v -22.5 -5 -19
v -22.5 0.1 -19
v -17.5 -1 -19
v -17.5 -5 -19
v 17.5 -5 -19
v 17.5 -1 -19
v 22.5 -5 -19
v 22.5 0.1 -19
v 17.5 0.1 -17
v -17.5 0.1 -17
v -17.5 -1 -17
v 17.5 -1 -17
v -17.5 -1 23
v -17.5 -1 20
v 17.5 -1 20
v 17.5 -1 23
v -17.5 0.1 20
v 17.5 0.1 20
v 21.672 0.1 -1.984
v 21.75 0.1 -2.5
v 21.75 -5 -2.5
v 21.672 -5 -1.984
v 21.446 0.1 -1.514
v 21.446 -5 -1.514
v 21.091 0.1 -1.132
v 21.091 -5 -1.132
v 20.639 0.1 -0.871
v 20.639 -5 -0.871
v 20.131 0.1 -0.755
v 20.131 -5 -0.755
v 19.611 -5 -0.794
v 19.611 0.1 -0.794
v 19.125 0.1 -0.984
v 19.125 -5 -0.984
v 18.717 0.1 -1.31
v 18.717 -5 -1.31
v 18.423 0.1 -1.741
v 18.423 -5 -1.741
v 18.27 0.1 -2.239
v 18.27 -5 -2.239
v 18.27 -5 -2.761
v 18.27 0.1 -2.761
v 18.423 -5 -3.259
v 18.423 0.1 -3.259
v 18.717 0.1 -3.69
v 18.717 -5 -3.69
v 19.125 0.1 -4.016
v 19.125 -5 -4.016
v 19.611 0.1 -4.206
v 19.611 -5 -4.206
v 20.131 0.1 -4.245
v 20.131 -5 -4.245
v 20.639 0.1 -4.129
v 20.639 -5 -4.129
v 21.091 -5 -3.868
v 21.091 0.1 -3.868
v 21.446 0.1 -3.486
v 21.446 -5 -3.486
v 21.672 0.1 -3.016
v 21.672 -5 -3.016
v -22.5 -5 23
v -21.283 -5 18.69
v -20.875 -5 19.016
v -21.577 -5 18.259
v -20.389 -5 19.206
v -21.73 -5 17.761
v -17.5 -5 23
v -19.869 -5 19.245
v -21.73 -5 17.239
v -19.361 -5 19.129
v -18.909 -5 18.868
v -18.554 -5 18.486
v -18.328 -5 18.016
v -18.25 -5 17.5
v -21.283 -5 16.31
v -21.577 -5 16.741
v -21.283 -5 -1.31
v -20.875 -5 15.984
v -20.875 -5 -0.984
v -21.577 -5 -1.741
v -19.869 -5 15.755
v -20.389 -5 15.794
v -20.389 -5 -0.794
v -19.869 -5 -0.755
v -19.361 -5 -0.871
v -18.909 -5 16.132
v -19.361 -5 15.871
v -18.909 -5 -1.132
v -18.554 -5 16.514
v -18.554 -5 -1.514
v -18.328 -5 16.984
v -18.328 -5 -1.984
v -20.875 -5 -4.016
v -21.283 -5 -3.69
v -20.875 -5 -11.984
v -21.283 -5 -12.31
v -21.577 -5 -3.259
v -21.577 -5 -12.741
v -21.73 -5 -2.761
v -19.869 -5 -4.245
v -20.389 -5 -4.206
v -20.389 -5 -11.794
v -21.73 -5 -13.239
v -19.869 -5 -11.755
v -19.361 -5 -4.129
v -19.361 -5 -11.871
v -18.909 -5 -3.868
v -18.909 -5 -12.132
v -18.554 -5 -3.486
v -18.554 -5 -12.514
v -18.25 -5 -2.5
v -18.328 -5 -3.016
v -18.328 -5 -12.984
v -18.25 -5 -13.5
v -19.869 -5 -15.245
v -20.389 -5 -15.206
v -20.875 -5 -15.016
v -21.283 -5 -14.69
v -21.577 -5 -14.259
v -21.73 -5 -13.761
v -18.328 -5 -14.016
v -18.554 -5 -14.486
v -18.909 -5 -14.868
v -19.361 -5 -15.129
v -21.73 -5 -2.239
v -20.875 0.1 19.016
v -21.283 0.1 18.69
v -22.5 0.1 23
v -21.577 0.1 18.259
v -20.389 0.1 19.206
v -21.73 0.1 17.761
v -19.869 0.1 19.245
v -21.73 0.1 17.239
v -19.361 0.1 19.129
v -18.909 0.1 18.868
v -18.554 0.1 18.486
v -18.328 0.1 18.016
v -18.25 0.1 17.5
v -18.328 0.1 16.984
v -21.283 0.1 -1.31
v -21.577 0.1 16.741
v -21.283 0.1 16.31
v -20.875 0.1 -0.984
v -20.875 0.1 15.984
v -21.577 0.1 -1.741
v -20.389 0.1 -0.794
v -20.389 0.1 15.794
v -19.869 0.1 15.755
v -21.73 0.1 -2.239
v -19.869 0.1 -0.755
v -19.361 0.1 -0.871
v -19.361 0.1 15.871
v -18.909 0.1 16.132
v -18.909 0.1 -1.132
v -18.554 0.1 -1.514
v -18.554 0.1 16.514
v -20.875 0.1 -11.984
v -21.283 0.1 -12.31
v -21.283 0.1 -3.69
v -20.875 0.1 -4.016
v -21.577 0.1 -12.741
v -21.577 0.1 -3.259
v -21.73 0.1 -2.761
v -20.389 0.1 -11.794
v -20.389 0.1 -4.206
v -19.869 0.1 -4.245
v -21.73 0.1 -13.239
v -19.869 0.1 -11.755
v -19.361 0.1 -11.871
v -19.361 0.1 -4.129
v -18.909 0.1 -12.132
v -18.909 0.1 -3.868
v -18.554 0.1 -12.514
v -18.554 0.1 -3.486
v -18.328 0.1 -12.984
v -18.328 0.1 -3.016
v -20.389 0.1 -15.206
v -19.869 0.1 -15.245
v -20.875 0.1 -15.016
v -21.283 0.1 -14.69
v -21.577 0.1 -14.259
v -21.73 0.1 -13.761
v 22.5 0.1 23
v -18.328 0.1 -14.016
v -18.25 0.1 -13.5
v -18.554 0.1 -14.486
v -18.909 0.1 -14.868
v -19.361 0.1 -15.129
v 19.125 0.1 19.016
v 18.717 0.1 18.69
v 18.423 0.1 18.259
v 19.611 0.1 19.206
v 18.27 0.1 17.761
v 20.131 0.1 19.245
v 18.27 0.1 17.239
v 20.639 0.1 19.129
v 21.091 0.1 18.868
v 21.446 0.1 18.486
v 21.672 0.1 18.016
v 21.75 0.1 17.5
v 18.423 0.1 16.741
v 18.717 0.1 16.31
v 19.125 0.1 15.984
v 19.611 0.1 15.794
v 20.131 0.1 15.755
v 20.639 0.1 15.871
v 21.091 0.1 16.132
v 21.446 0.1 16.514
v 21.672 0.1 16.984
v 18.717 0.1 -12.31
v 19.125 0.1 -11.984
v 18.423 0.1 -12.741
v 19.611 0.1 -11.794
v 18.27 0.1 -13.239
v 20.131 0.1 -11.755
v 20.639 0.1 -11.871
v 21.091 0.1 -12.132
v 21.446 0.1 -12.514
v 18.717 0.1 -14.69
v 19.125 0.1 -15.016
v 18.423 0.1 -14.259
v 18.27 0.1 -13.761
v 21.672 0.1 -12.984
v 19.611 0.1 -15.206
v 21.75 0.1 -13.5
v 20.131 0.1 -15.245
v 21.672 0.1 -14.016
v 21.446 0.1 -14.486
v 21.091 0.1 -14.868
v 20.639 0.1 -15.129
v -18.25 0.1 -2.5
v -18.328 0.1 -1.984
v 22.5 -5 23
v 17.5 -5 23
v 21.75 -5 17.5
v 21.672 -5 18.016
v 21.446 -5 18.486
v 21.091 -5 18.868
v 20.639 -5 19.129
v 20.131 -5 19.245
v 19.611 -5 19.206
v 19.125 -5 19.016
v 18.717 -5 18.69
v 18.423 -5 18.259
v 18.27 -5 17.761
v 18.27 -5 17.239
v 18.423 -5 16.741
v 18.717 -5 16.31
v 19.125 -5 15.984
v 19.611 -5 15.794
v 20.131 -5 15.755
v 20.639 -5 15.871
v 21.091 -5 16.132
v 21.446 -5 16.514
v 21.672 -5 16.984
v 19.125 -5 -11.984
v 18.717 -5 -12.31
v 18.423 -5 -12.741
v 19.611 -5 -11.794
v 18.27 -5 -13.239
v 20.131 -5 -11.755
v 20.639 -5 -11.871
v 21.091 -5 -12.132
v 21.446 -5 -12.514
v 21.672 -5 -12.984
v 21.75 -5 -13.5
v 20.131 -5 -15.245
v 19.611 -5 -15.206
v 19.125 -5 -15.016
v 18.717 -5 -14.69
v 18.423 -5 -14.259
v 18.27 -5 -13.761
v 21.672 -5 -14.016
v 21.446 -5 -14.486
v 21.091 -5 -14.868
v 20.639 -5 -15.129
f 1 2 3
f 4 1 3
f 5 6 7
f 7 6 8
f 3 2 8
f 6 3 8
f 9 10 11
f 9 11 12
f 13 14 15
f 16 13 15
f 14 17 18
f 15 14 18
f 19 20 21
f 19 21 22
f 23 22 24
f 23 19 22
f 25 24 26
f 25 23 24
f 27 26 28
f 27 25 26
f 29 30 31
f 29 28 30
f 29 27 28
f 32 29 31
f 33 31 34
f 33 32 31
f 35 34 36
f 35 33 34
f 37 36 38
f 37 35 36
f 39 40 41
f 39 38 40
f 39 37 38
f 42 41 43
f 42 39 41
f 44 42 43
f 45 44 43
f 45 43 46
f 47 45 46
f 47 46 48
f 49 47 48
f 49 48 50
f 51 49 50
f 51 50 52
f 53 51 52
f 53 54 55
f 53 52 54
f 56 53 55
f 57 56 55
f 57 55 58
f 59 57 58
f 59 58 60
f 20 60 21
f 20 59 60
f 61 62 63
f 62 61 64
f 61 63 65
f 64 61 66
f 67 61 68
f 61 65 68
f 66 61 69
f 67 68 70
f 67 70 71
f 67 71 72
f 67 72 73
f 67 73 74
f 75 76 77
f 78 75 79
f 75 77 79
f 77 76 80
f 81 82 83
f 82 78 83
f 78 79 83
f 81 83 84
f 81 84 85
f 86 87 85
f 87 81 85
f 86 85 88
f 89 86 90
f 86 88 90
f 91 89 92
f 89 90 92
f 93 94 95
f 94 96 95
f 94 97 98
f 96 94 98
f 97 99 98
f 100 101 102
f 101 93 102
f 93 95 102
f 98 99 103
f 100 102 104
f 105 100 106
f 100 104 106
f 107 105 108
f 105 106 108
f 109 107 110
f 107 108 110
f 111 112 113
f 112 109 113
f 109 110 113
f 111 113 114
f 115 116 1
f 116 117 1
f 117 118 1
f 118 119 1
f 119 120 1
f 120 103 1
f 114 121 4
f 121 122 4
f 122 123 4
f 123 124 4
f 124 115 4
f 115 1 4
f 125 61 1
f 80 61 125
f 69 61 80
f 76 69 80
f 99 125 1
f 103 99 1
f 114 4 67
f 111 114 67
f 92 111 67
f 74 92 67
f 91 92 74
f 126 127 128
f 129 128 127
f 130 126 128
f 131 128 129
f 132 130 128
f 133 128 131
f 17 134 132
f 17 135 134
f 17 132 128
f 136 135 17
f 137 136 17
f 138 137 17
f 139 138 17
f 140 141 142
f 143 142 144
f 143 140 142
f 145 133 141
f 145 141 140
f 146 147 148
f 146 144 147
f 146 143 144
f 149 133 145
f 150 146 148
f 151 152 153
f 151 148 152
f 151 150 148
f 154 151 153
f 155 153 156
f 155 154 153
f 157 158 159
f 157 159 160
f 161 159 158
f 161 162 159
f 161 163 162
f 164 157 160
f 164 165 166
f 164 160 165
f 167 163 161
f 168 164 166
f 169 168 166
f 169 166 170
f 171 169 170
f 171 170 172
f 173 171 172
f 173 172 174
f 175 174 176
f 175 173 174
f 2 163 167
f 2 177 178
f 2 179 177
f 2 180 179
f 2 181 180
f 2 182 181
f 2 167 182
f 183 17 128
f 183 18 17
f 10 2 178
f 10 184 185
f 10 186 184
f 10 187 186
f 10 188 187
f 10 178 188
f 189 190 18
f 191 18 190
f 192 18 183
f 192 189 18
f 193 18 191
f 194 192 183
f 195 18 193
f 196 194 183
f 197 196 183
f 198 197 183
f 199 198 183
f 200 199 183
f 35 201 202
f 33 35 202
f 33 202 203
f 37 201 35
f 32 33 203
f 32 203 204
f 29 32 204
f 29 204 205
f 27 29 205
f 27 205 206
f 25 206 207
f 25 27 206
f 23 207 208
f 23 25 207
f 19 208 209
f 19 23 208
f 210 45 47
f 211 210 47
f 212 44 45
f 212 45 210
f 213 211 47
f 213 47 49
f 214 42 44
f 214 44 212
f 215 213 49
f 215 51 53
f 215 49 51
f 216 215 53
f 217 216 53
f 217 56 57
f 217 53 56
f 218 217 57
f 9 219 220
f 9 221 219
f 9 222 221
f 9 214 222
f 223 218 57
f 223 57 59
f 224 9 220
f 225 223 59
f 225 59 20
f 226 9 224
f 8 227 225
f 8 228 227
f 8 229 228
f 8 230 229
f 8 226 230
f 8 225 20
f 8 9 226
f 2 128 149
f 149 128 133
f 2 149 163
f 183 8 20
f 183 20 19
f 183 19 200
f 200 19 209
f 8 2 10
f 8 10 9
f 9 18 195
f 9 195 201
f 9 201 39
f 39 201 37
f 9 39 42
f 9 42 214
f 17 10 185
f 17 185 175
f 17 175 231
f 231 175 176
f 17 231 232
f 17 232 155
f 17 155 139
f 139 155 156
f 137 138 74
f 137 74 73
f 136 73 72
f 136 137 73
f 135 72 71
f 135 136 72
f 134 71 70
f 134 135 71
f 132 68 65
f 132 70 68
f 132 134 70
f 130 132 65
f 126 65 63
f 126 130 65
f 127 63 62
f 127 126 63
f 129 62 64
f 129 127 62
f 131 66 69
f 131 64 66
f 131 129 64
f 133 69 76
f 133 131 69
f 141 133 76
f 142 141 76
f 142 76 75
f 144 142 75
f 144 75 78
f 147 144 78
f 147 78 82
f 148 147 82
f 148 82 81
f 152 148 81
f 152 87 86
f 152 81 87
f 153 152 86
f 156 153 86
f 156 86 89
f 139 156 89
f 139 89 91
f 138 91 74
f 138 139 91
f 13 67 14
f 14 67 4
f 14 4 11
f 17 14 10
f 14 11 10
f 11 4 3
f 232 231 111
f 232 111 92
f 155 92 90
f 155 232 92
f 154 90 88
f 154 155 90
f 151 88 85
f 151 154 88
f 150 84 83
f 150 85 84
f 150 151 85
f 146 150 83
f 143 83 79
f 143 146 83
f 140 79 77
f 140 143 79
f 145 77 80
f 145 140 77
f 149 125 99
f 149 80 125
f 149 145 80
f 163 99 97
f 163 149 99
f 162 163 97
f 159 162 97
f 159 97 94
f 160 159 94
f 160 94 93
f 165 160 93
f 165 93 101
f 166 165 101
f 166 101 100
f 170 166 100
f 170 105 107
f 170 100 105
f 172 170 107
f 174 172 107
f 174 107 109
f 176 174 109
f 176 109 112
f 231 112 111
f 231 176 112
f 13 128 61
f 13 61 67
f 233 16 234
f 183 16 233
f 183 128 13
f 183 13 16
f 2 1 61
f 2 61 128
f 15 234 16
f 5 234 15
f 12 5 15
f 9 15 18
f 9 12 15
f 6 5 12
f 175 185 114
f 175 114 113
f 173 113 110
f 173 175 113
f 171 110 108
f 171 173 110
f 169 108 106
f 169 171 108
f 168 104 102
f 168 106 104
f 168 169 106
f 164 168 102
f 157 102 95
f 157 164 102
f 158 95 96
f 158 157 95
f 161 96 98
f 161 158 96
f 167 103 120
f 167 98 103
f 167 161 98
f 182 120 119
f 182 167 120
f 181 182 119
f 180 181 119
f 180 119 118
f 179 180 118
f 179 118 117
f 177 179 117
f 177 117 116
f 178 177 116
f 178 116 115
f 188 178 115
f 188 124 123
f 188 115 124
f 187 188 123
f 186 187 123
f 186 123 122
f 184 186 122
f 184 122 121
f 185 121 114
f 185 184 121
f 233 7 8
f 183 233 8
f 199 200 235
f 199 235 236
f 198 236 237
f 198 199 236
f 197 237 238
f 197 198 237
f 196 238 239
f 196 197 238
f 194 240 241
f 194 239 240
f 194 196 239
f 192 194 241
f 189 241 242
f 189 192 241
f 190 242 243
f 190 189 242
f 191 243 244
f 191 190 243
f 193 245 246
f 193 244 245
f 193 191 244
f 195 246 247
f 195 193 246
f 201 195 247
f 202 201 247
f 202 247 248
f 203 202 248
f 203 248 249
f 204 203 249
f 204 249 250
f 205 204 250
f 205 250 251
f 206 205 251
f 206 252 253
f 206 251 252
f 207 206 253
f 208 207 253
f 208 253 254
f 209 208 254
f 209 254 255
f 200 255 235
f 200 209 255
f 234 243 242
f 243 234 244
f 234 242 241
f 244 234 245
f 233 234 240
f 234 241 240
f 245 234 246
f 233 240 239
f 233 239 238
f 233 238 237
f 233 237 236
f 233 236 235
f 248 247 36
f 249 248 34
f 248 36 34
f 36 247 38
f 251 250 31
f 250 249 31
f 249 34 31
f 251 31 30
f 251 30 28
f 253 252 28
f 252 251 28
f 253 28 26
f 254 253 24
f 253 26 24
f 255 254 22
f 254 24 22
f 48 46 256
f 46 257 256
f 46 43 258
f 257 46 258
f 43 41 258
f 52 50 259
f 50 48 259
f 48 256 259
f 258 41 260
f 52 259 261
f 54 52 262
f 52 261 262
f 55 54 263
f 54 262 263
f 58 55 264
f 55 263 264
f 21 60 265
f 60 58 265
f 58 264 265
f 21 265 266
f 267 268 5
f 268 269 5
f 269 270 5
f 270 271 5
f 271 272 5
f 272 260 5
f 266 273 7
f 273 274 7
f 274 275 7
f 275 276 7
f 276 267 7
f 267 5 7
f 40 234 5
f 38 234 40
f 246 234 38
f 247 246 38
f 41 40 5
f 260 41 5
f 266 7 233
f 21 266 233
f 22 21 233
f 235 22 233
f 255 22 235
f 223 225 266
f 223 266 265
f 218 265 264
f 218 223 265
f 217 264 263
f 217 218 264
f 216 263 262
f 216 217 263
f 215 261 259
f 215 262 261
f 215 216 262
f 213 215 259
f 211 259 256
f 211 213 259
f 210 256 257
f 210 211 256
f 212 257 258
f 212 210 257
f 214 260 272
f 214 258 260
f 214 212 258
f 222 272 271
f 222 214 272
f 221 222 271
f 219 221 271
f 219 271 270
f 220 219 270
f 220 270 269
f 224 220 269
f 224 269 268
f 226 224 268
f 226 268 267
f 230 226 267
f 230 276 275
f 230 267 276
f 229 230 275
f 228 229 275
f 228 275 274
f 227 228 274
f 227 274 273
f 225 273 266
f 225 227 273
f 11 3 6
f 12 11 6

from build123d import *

# Parameters (mm, degrees)
CYLINDER023_R          = 1.75
CYLINDER023_DEPTH      = 44
CYLINDER023_ROLL_ANGLE = 90
CYLINDER024_R          = 1.75
CYLINDER024_DEPTH      = 44
CYLINDER024_ROLL_ANGLE = 90
CYLINDER025_R          = 1.75
CYLINDER025_DEPTH      = 44
CYLINDER025_ROLL_ANGLE = 90
CYLINDER034_R          = 1.75
CYLINDER034_DEPTH      = 44
CYLINDER034_ROLL_ANGLE = 90
CYLINDER035_R          = 1.75
CYLINDER035_DEPTH      = 44
CYLINDER035_ROLL_ANGLE = 90
CYLINDER022_R          = 1.75
CYLINDER022_DEPTH      = 44
CYLINDER022_ROLL_ANGLE = 90
BOX048_W               = 44
BOX048_H               = 1.1
BOX048_DEPTH           = 3
BOX047_W               = 5
BOX047_H               = 5.1
BOX047_DEPTH           = 42
BOX049_W               = 44
BOX049_H               = 1.1
BOX049_DEPTH           = 2
BOX046_W               = 5
BOX046_H               = 5.1
BOX046_DEPTH           = 42


with BuildPart() as cylinder_for_hole_2_motherboard002:
    # Cylinder023 → Cylinder023 (new body)
    with BuildSketch(Plane.XY):
        Circle(CYLINDER023_R)
    extrude(amount=CYLINDER023_DEPTH)


with BuildPart() as cylinder_for_hole_2_motherboard002_1:
    # Cylinder023 roll: moved
    add(cylinder_for_hole_2_motherboard002.part.rotate(Axis((0, 0, 0), (1, 0, 0)), CYLINDER023_ROLL_ANGLE))


with BuildPart() as cylinder_for_hole_2_motherboard002_2:
    # Cylinder023 placement: moved
    add(cylinder_for_hole_2_motherboard002_1.part.moved(Location((20, 6, 17.5))))


with BuildPart() as cylinder_for_hole_9_groovemount_l001:
    # Cylinder024 → Cylinder024 (new body)
    with BuildSketch(Plane.XY):
        Circle(CYLINDER024_R)
    extrude(amount=CYLINDER024_DEPTH)


with BuildPart() as cylinder_for_hole_9_groovemount_l001_1:
    # Cylinder024 roll: moved
    add(cylinder_for_hole_9_groovemount_l001.part.rotate(Axis((0, 0, 0), (1, 0, 0)), CYLINDER024_ROLL_ANGLE))


with BuildPart() as cylinder_for_hole_9_groovemount_l001_2:
    # Cylinder024 placement: moved
    add(cylinder_for_hole_9_groovemount_l001_1.part.moved(Location((-20, 6, -2.5))))


with BuildPart() as cylinder_for_hole_10_groovemount_r001:
    # Cylinder025 → Cylinder025 (new body)
    with BuildSketch(Plane.XY):
        Circle(CYLINDER025_R)
    extrude(amount=CYLINDER025_DEPTH)


with BuildPart() as cylinder_for_hole_10_groovemount_r001_1:
    # Cylinder025 roll: moved
    add(cylinder_for_hole_10_groovemount_r001.part.rotate(Axis((0, 0, 0), (1, 0, 0)), CYLINDER025_ROLL_ANGLE))


with BuildPart() as cylinder_for_hole_10_groovemount_r001_2:
    # Cylinder025 placement: moved
    add(cylinder_for_hole_10_groovemount_r001_1.part.moved(Location((20, 6, -2.5))))


with BuildPart() as cylinder_for_hole_3_motherboard002:
    # Cylinder034 → Cylinder034 (new body)
    with BuildSketch(Plane.XY):
        Circle(CYLINDER034_R)
    extrude(amount=CYLINDER034_DEPTH)


with BuildPart() as cylinder_for_hole_3_motherboard002_1:
    # Cylinder034 roll: moved
    add(cylinder_for_hole_3_motherboard002.part.rotate(Axis((0, 0, 0), (1, 0, 0)), CYLINDER034_ROLL_ANGLE))


with BuildPart() as cylinder_for_hole_3_motherboard002_2:
    # Cylinder034 placement: moved
    add(cylinder_for_hole_3_motherboard002_1.part.moved(Location((-20, 6, -13.5))))


with BuildPart() as cylinder_for_hole_4_motherboard002:
    # Cylinder035 → Cylinder035 (new body)
    with BuildSketch(Plane.XY):
        Circle(CYLINDER035_R)
    extrude(amount=CYLINDER035_DEPTH)


with BuildPart() as cylinder_for_hole_4_motherboard002_1:
    # Cylinder035 roll: moved
    add(cylinder_for_hole_4_motherboard002.part.rotate(Axis((0, 0, 0), (1, 0, 0)), CYLINDER035_ROLL_ANGLE))


with BuildPart() as cylinder_for_hole_4_motherboard002_2:
    # Cylinder035 placement: moved
    add(cylinder_for_hole_4_motherboard002_1.part.moved(Location((20, 6, -13.5))))


with BuildPart() as superstructure_holes:
    # Cylinder022 → Cylinder022 (new body)
    with BuildSketch(Plane.XY):
        Circle(CYLINDER022_R)
    extrude(amount=CYLINDER022_DEPTH)


with BuildPart() as superstructure_holes_1:
    # Cylinder022 roll: moved
    add(superstructure_holes.part.rotate(Axis((0, 0, 0), (1, 0, 0)), CYLINDER022_ROLL_ANGLE))


with BuildPart() as superstructure_holes_2:
    # Cylinder022 placement: moved
    add(superstructure_holes_1.part.moved(Location((-20, 6, 17.5))))

    # Fusion008: union cylinder for hole 2 - Motherboard002, cylinder for hole 9 - Groovemount L001, cylinder for hole 10 - Groovemount R001, cylinder for hole 3 - Motherboard002, cylinder for hole 4 - Motherboard002
    add(cylinder_for_hole_2_motherboard002_2.part)
    add(cylinder_for_hole_9_groovemount_l001_2.part)
    add(cylinder_for_hole_10_groovemount_r001_2.part)
    add(cylinder_for_hole_3_motherboard002_2.part)
    add(cylinder_for_hole_4_motherboard002_2.part)


with BuildPart() as shim_back:
    # Box048 → Box048 (new body)
    with BuildSketch(Plane(origin=(-22, -1, 20), x_dir=(1, 0, 0), z_dir=(0, 0, 1))):
        with Locations((22, 0.55)):
            Rectangle(BOX048_W, BOX048_H)
    extrude(amount=BOX048_DEPTH)


with BuildPart() as shim_l001:
    # Box047 → Box047 (new body)
    with BuildSketch(Plane(origin=(-22.5, -5, -19), x_dir=(1, 0, 0), z_dir=(0, 0, 1))):
        with Locations((2.5, 2.55)):
            Rectangle(BOX047_W, BOX047_H)
    extrude(amount=BOX047_DEPTH)


with BuildPart() as shim_front:
    # Box049 → Box049 (new body)
    with BuildSketch(Plane(origin=(-22, -1, -19), x_dir=(1, 0, 0), z_dir=(0, 0, 1))):
        with Locations((22, 0.55)):
            Rectangle(BOX049_W, BOX049_H)
    extrude(amount=BOX049_DEPTH)


with BuildPart() as superstructure_with_holes:
    # Box046 → Box046 (new body)
    with BuildSketch(Plane(origin=(17.5, -5, -19), x_dir=(1, 0, 0), z_dir=(0, 0, 1))):
        with Locations((2.5, 2.55)):
            Rectangle(BOX046_W, BOX046_H)
    extrude(amount=BOX046_DEPTH)

    # Fusion007: union shim back, shim L001, shim front
    add(shim_back.part)
    add(shim_l001.part)
    add(shim_front.part)

    # Cut007: cut superstructure holes
    add(superstructure_holes_2.part, mode=Mode.SUBTRACT)


solid = superstructure_with_holes.part
